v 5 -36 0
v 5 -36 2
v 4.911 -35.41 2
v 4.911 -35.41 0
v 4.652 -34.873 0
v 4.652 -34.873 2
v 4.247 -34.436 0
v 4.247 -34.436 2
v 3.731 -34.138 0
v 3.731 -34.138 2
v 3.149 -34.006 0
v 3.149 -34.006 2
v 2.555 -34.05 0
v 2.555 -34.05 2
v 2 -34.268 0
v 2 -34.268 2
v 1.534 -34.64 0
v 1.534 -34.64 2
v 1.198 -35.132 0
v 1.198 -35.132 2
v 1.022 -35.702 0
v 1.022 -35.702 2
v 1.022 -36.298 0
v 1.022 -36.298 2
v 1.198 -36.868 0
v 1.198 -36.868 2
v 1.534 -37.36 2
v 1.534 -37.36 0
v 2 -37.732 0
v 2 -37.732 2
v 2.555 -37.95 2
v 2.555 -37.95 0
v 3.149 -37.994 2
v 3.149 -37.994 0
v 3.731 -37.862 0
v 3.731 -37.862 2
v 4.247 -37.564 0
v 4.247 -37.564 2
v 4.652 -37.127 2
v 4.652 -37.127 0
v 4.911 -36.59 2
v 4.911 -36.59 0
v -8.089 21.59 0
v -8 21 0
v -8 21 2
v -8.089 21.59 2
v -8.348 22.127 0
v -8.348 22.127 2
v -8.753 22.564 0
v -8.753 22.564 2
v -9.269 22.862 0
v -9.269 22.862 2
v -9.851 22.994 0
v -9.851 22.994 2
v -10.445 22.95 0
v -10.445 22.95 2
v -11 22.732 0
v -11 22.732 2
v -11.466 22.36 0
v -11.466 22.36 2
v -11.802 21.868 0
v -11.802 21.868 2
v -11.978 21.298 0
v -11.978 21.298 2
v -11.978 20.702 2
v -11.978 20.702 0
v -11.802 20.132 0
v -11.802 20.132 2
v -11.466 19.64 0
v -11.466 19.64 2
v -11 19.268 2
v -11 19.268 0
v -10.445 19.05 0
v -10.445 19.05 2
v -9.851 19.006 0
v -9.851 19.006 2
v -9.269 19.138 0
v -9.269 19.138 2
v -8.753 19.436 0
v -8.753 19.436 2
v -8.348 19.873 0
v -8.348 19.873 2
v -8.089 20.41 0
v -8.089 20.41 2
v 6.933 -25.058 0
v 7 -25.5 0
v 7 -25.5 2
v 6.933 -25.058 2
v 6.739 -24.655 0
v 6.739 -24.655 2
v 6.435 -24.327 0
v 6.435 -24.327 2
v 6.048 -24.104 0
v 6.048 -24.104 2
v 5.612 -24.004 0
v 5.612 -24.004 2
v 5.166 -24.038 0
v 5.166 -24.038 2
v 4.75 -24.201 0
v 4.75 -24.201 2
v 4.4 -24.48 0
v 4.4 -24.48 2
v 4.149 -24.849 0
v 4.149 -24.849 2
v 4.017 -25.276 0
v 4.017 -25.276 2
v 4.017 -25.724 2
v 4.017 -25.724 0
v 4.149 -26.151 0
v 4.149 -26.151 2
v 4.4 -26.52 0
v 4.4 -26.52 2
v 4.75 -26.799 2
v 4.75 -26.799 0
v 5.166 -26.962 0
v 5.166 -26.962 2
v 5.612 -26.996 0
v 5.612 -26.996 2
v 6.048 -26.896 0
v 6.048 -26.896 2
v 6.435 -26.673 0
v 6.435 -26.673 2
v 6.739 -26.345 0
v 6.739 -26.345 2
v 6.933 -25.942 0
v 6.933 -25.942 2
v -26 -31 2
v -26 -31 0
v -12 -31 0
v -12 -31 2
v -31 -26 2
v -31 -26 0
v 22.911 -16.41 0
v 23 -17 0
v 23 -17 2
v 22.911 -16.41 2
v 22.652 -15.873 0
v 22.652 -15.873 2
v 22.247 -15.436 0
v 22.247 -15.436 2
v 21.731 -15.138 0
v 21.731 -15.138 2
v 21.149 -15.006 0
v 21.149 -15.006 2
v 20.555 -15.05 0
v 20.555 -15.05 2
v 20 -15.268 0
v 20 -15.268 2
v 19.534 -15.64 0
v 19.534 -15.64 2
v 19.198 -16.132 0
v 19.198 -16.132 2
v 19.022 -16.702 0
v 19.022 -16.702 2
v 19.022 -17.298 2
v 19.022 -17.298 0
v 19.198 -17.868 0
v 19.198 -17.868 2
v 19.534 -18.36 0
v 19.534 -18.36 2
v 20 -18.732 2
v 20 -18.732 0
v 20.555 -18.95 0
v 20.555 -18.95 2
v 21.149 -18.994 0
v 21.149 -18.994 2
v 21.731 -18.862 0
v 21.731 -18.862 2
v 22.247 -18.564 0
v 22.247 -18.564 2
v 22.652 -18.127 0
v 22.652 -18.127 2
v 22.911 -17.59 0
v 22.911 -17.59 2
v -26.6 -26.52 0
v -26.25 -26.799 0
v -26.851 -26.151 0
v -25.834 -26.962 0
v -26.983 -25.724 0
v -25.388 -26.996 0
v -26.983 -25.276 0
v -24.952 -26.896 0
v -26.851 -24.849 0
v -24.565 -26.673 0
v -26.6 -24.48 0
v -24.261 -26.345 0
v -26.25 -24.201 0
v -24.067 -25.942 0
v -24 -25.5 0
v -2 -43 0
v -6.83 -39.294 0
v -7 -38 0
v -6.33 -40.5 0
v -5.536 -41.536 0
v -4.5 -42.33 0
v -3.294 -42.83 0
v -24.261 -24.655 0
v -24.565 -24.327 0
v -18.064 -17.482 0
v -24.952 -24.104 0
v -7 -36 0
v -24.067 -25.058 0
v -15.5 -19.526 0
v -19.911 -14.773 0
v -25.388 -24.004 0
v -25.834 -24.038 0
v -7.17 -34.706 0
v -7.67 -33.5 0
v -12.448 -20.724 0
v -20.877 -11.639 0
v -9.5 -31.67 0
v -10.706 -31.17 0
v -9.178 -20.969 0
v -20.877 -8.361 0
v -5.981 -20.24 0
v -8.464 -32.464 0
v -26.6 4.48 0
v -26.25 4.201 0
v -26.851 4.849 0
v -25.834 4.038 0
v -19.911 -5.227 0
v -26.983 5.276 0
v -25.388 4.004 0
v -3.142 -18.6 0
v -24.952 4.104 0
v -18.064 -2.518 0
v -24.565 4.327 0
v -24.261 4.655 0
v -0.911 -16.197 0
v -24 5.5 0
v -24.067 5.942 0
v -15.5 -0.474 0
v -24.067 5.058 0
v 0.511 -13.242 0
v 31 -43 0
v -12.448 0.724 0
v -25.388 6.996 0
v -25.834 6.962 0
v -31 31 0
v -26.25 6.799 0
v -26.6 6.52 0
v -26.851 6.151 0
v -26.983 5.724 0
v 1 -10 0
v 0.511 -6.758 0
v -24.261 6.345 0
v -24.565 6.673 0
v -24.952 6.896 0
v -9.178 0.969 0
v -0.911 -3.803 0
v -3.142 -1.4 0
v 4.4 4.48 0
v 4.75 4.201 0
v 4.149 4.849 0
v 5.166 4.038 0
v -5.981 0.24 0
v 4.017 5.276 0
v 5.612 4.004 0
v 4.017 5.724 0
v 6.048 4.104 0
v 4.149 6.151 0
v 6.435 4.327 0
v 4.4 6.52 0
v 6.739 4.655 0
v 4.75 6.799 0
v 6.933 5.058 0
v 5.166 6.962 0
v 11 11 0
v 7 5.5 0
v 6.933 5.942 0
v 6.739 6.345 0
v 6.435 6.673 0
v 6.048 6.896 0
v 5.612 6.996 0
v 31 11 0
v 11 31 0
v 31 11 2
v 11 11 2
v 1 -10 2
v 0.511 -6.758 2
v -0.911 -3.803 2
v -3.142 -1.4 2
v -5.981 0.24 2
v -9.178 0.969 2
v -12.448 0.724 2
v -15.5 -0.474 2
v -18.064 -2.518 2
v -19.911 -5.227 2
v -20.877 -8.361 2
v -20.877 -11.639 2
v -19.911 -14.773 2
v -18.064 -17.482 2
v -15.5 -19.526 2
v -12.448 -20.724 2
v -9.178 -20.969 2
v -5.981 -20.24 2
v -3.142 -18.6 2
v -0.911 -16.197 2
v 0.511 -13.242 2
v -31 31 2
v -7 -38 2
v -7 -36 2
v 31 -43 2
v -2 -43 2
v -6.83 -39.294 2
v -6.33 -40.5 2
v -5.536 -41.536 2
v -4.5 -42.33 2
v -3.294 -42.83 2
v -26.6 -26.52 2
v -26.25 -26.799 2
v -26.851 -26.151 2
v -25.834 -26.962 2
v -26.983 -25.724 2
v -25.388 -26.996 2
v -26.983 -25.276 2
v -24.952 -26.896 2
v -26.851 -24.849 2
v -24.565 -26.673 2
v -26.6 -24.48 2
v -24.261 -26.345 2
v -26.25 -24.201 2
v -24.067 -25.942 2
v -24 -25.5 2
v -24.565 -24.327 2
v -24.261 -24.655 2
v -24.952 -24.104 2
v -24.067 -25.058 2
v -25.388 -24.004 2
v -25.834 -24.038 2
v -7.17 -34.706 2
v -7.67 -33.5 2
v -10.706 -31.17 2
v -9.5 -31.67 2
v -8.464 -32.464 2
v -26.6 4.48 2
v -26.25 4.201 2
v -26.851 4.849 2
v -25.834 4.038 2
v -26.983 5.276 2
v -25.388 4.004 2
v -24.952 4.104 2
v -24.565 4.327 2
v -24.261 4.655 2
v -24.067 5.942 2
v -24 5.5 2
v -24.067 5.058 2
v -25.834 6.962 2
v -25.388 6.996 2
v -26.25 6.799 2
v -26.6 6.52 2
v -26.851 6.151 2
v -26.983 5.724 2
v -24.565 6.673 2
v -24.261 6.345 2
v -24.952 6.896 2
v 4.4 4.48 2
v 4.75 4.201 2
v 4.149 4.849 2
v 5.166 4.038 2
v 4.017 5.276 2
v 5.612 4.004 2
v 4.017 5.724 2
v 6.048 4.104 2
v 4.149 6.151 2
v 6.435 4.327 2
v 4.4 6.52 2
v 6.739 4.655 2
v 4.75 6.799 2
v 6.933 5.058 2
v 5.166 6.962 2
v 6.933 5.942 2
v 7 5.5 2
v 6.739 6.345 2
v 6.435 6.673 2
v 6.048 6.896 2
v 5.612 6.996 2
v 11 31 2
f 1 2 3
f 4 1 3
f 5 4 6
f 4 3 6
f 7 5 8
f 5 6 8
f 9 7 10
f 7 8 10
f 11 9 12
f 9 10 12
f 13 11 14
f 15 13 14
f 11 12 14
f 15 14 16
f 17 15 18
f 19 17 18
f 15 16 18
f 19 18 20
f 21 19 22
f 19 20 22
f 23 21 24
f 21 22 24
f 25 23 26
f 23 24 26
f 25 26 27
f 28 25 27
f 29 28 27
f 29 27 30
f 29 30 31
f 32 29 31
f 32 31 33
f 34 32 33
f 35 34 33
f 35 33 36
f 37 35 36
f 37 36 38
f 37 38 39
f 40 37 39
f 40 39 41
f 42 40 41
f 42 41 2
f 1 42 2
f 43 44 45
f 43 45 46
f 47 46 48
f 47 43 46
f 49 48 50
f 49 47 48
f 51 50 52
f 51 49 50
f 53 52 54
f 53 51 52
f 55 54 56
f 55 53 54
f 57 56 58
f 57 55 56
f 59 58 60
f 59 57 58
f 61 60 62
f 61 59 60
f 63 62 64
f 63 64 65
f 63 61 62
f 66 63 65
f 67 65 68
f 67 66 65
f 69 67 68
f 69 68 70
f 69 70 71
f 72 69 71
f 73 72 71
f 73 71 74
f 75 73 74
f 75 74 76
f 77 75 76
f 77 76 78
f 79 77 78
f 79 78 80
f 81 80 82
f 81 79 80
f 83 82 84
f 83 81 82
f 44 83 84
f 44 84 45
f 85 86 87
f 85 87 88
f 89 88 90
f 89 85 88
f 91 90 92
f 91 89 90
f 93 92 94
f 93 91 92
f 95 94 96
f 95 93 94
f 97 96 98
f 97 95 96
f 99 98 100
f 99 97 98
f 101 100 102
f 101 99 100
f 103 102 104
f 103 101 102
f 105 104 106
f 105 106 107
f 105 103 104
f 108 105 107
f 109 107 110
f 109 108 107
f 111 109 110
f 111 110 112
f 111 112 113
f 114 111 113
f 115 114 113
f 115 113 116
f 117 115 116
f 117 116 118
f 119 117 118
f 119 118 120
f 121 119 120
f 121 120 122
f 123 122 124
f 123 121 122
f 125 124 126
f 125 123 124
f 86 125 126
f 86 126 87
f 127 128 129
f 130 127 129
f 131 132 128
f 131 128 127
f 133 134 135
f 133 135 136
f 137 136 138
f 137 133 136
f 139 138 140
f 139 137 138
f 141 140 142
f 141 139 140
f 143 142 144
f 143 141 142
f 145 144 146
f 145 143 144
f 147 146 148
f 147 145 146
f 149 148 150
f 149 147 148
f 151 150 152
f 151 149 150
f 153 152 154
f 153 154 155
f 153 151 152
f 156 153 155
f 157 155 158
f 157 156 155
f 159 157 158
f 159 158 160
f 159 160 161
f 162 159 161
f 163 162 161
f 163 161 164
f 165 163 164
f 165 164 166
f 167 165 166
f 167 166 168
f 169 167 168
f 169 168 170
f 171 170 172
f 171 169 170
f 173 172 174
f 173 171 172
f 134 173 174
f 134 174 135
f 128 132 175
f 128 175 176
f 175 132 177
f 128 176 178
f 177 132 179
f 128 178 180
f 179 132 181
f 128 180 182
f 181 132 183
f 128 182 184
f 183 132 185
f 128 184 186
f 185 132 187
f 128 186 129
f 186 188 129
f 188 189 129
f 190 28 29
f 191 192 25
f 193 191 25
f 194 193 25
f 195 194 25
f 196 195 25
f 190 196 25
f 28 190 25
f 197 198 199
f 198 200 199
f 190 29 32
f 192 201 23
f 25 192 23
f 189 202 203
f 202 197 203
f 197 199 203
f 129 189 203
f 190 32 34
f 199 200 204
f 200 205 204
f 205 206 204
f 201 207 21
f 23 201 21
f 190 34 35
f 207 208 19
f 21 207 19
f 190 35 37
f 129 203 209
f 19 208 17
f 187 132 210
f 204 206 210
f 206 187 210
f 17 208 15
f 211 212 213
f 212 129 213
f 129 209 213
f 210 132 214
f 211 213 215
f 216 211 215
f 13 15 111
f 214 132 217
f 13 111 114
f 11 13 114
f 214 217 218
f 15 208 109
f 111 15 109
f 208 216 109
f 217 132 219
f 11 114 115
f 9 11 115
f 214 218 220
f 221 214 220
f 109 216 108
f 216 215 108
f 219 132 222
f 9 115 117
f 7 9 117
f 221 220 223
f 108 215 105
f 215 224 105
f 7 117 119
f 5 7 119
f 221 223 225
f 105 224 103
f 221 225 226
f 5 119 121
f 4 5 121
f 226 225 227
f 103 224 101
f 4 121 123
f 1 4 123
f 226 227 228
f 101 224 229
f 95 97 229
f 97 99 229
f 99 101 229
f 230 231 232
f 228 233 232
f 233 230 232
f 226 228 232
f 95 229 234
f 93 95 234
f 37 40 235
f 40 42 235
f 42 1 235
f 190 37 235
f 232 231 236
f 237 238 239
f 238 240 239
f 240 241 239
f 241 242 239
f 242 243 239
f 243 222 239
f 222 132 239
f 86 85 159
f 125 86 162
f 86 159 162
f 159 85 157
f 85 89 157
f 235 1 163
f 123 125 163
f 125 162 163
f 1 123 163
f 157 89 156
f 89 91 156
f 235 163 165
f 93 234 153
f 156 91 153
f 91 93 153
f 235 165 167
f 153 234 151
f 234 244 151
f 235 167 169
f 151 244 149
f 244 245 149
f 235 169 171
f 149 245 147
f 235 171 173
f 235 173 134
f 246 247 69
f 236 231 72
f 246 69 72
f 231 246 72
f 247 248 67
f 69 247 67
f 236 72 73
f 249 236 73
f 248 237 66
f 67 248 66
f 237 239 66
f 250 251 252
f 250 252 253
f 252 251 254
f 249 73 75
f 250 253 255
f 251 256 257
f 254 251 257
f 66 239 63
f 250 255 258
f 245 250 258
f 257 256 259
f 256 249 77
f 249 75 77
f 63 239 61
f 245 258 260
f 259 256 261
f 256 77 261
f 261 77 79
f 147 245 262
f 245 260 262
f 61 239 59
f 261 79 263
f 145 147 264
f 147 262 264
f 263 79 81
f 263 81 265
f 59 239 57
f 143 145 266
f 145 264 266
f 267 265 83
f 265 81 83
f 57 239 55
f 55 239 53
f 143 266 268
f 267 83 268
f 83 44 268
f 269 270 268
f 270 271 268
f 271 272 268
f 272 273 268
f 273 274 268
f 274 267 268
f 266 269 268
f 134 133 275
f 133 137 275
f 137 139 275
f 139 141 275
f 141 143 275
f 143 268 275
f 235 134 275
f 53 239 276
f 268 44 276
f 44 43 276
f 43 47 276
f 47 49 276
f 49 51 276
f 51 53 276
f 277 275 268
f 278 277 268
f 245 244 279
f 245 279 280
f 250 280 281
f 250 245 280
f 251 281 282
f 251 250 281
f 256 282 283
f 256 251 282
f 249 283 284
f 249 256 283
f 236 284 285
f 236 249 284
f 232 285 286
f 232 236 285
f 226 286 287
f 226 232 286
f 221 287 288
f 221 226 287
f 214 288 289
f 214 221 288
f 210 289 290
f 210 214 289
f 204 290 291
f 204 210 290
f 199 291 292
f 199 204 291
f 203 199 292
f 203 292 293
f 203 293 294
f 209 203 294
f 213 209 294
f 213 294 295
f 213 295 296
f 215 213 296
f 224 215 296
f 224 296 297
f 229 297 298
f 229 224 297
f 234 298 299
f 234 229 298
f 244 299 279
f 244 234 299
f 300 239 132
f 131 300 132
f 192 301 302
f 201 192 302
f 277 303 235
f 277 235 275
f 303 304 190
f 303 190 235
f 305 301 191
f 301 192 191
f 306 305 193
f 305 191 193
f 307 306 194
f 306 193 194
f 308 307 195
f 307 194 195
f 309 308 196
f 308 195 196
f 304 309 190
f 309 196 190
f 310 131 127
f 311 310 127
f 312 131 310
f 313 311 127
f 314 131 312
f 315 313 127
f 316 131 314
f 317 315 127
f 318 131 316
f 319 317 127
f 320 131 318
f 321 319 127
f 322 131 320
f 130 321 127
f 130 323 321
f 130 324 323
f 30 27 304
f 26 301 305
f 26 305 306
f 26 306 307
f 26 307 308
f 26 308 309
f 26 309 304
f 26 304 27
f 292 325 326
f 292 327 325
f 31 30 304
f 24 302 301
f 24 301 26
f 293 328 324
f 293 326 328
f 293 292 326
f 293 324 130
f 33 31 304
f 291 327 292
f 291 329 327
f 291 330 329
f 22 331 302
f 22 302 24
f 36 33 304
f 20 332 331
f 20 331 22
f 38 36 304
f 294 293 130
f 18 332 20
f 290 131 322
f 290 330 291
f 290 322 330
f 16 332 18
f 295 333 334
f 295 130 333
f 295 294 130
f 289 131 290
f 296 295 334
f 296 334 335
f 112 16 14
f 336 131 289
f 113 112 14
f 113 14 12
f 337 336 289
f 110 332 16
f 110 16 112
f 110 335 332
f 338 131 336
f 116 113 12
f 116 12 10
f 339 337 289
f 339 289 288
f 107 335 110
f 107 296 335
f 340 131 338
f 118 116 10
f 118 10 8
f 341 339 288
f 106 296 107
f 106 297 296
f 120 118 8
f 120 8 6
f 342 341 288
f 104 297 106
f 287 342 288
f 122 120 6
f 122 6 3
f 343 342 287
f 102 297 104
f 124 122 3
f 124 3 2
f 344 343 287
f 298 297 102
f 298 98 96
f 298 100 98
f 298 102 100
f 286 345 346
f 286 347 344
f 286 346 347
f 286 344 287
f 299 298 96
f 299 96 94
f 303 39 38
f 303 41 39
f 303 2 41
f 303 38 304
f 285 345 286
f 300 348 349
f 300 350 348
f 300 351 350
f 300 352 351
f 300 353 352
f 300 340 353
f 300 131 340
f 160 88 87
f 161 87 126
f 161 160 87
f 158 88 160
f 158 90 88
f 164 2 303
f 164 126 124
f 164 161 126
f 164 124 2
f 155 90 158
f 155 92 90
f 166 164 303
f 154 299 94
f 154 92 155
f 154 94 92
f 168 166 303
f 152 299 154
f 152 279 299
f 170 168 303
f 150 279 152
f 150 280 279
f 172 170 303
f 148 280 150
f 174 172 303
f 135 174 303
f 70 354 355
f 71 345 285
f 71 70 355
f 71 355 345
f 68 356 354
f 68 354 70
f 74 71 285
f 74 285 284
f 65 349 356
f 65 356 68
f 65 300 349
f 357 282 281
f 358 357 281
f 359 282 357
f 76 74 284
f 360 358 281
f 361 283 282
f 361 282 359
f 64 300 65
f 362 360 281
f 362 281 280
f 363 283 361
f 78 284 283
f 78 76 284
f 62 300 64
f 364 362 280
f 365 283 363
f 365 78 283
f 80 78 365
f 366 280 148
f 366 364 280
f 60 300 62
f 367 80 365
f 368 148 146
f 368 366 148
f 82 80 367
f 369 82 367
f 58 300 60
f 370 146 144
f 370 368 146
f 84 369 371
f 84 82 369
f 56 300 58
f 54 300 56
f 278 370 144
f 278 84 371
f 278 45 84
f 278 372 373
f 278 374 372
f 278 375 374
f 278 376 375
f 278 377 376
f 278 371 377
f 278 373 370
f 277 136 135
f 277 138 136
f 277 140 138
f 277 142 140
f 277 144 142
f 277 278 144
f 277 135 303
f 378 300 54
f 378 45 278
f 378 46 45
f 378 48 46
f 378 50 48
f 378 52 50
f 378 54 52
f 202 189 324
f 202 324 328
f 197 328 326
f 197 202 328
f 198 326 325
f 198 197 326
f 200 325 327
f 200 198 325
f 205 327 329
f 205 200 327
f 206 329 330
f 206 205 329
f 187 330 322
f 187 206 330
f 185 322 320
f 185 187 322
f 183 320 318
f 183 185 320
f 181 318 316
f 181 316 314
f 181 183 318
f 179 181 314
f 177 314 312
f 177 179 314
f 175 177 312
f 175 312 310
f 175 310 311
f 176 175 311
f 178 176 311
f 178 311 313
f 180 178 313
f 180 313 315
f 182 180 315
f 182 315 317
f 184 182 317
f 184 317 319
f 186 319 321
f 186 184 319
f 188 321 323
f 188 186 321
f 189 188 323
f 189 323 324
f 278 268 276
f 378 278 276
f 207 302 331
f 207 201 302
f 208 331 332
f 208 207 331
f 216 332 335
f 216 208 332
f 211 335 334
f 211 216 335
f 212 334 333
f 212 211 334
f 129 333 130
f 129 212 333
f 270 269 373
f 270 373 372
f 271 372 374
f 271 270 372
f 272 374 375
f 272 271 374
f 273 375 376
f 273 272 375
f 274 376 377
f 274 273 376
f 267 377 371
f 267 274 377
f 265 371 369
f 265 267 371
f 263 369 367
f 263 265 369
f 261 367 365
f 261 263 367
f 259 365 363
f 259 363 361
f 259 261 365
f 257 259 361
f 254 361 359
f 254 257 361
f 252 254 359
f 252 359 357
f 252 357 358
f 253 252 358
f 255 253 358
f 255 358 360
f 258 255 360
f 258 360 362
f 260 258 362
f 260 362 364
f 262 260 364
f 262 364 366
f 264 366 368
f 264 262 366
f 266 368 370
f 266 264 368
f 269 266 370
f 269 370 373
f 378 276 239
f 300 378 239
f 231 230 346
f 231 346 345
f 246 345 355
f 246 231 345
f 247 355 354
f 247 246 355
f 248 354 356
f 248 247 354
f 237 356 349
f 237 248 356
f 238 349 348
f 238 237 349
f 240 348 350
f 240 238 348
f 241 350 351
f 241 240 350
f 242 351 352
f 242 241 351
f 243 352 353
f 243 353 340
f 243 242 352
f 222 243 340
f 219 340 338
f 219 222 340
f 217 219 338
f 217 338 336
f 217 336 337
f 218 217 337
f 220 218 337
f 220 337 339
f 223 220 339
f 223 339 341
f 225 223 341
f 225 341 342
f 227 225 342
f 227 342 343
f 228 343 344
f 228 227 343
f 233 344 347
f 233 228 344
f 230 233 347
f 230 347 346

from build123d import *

# Parameters (mm, degrees)
F0_R     = 1.5
F0_R_2   = 11
F0_R_3   = 2
F1_DEPTH = 2
F2_SIZE  = 5
F3_W     = 38
F3_H     = 12
F4_DEPTH = 2
F5_R     = 2
F6_DEPTH = 25
F7_R     = 5


with BuildPart() as f1:
    # F0 (on Top) → F1 (new body)
    with BuildSketch(Plane.XY):
        Polygon((-31, -31), (31, -31), (31, 11), (11, 11), (11, 31), (-31, 31), align=None)
        with Locations((-25.5, -25.5)):
            Circle(F0_R, mode=Mode.SUBTRACT)
        with Locations((-10, -10)):
            Circle(F0_R_2, mode=Mode.SUBTRACT)
        with Locations((5.5, -25.5)):
            Circle(F0_R, mode=Mode.SUBTRACT)
        with Locations((21, -17)):
            Circle(F0_R_3, mode=Mode.SUBTRACT)
        with Locations((-25.5, 5.5)):
            Circle(F0_R, mode=Mode.SUBTRACT)
        with Locations((-10, 21)):
            Circle(F0_R_3, mode=Mode.SUBTRACT)
        with Locations((5.5, 5.5)):
            Circle(F0_R, mode=Mode.SUBTRACT)
    extrude(amount=F1_DEPTH)

    # F2
    f2_edges = [f1.edges().sort_by_distance(p)[0] for p in [
        (-31, -31, 1),
    ]]
    chamfer(f2_edges, length=F2_SIZE)

    # F3 (on face) → F4 (join)
    with BuildSketch(Plane.XY.offset(2)):
        with Locations((12, -37)):
            Rectangle(F3_W, F3_H)
    extrude(amount=-F4_DEPTH)

    # F5 (on face) → F6 (cut)
    with BuildSketch(Plane.XY.offset(2)):
        with Locations((3, -36)):
            Circle(F5_R)
    extrude(amount=-F6_DEPTH, mode=Mode.SUBTRACT)

    # F7
    f7_edges = [f1.edges().sort_by_distance(p)[0] for p in [
        (-7, -43, 1),
        (-7, -31, 1),
    ]]
    fillet(f7_edges, radius=F7_R)


solid = f1.part
